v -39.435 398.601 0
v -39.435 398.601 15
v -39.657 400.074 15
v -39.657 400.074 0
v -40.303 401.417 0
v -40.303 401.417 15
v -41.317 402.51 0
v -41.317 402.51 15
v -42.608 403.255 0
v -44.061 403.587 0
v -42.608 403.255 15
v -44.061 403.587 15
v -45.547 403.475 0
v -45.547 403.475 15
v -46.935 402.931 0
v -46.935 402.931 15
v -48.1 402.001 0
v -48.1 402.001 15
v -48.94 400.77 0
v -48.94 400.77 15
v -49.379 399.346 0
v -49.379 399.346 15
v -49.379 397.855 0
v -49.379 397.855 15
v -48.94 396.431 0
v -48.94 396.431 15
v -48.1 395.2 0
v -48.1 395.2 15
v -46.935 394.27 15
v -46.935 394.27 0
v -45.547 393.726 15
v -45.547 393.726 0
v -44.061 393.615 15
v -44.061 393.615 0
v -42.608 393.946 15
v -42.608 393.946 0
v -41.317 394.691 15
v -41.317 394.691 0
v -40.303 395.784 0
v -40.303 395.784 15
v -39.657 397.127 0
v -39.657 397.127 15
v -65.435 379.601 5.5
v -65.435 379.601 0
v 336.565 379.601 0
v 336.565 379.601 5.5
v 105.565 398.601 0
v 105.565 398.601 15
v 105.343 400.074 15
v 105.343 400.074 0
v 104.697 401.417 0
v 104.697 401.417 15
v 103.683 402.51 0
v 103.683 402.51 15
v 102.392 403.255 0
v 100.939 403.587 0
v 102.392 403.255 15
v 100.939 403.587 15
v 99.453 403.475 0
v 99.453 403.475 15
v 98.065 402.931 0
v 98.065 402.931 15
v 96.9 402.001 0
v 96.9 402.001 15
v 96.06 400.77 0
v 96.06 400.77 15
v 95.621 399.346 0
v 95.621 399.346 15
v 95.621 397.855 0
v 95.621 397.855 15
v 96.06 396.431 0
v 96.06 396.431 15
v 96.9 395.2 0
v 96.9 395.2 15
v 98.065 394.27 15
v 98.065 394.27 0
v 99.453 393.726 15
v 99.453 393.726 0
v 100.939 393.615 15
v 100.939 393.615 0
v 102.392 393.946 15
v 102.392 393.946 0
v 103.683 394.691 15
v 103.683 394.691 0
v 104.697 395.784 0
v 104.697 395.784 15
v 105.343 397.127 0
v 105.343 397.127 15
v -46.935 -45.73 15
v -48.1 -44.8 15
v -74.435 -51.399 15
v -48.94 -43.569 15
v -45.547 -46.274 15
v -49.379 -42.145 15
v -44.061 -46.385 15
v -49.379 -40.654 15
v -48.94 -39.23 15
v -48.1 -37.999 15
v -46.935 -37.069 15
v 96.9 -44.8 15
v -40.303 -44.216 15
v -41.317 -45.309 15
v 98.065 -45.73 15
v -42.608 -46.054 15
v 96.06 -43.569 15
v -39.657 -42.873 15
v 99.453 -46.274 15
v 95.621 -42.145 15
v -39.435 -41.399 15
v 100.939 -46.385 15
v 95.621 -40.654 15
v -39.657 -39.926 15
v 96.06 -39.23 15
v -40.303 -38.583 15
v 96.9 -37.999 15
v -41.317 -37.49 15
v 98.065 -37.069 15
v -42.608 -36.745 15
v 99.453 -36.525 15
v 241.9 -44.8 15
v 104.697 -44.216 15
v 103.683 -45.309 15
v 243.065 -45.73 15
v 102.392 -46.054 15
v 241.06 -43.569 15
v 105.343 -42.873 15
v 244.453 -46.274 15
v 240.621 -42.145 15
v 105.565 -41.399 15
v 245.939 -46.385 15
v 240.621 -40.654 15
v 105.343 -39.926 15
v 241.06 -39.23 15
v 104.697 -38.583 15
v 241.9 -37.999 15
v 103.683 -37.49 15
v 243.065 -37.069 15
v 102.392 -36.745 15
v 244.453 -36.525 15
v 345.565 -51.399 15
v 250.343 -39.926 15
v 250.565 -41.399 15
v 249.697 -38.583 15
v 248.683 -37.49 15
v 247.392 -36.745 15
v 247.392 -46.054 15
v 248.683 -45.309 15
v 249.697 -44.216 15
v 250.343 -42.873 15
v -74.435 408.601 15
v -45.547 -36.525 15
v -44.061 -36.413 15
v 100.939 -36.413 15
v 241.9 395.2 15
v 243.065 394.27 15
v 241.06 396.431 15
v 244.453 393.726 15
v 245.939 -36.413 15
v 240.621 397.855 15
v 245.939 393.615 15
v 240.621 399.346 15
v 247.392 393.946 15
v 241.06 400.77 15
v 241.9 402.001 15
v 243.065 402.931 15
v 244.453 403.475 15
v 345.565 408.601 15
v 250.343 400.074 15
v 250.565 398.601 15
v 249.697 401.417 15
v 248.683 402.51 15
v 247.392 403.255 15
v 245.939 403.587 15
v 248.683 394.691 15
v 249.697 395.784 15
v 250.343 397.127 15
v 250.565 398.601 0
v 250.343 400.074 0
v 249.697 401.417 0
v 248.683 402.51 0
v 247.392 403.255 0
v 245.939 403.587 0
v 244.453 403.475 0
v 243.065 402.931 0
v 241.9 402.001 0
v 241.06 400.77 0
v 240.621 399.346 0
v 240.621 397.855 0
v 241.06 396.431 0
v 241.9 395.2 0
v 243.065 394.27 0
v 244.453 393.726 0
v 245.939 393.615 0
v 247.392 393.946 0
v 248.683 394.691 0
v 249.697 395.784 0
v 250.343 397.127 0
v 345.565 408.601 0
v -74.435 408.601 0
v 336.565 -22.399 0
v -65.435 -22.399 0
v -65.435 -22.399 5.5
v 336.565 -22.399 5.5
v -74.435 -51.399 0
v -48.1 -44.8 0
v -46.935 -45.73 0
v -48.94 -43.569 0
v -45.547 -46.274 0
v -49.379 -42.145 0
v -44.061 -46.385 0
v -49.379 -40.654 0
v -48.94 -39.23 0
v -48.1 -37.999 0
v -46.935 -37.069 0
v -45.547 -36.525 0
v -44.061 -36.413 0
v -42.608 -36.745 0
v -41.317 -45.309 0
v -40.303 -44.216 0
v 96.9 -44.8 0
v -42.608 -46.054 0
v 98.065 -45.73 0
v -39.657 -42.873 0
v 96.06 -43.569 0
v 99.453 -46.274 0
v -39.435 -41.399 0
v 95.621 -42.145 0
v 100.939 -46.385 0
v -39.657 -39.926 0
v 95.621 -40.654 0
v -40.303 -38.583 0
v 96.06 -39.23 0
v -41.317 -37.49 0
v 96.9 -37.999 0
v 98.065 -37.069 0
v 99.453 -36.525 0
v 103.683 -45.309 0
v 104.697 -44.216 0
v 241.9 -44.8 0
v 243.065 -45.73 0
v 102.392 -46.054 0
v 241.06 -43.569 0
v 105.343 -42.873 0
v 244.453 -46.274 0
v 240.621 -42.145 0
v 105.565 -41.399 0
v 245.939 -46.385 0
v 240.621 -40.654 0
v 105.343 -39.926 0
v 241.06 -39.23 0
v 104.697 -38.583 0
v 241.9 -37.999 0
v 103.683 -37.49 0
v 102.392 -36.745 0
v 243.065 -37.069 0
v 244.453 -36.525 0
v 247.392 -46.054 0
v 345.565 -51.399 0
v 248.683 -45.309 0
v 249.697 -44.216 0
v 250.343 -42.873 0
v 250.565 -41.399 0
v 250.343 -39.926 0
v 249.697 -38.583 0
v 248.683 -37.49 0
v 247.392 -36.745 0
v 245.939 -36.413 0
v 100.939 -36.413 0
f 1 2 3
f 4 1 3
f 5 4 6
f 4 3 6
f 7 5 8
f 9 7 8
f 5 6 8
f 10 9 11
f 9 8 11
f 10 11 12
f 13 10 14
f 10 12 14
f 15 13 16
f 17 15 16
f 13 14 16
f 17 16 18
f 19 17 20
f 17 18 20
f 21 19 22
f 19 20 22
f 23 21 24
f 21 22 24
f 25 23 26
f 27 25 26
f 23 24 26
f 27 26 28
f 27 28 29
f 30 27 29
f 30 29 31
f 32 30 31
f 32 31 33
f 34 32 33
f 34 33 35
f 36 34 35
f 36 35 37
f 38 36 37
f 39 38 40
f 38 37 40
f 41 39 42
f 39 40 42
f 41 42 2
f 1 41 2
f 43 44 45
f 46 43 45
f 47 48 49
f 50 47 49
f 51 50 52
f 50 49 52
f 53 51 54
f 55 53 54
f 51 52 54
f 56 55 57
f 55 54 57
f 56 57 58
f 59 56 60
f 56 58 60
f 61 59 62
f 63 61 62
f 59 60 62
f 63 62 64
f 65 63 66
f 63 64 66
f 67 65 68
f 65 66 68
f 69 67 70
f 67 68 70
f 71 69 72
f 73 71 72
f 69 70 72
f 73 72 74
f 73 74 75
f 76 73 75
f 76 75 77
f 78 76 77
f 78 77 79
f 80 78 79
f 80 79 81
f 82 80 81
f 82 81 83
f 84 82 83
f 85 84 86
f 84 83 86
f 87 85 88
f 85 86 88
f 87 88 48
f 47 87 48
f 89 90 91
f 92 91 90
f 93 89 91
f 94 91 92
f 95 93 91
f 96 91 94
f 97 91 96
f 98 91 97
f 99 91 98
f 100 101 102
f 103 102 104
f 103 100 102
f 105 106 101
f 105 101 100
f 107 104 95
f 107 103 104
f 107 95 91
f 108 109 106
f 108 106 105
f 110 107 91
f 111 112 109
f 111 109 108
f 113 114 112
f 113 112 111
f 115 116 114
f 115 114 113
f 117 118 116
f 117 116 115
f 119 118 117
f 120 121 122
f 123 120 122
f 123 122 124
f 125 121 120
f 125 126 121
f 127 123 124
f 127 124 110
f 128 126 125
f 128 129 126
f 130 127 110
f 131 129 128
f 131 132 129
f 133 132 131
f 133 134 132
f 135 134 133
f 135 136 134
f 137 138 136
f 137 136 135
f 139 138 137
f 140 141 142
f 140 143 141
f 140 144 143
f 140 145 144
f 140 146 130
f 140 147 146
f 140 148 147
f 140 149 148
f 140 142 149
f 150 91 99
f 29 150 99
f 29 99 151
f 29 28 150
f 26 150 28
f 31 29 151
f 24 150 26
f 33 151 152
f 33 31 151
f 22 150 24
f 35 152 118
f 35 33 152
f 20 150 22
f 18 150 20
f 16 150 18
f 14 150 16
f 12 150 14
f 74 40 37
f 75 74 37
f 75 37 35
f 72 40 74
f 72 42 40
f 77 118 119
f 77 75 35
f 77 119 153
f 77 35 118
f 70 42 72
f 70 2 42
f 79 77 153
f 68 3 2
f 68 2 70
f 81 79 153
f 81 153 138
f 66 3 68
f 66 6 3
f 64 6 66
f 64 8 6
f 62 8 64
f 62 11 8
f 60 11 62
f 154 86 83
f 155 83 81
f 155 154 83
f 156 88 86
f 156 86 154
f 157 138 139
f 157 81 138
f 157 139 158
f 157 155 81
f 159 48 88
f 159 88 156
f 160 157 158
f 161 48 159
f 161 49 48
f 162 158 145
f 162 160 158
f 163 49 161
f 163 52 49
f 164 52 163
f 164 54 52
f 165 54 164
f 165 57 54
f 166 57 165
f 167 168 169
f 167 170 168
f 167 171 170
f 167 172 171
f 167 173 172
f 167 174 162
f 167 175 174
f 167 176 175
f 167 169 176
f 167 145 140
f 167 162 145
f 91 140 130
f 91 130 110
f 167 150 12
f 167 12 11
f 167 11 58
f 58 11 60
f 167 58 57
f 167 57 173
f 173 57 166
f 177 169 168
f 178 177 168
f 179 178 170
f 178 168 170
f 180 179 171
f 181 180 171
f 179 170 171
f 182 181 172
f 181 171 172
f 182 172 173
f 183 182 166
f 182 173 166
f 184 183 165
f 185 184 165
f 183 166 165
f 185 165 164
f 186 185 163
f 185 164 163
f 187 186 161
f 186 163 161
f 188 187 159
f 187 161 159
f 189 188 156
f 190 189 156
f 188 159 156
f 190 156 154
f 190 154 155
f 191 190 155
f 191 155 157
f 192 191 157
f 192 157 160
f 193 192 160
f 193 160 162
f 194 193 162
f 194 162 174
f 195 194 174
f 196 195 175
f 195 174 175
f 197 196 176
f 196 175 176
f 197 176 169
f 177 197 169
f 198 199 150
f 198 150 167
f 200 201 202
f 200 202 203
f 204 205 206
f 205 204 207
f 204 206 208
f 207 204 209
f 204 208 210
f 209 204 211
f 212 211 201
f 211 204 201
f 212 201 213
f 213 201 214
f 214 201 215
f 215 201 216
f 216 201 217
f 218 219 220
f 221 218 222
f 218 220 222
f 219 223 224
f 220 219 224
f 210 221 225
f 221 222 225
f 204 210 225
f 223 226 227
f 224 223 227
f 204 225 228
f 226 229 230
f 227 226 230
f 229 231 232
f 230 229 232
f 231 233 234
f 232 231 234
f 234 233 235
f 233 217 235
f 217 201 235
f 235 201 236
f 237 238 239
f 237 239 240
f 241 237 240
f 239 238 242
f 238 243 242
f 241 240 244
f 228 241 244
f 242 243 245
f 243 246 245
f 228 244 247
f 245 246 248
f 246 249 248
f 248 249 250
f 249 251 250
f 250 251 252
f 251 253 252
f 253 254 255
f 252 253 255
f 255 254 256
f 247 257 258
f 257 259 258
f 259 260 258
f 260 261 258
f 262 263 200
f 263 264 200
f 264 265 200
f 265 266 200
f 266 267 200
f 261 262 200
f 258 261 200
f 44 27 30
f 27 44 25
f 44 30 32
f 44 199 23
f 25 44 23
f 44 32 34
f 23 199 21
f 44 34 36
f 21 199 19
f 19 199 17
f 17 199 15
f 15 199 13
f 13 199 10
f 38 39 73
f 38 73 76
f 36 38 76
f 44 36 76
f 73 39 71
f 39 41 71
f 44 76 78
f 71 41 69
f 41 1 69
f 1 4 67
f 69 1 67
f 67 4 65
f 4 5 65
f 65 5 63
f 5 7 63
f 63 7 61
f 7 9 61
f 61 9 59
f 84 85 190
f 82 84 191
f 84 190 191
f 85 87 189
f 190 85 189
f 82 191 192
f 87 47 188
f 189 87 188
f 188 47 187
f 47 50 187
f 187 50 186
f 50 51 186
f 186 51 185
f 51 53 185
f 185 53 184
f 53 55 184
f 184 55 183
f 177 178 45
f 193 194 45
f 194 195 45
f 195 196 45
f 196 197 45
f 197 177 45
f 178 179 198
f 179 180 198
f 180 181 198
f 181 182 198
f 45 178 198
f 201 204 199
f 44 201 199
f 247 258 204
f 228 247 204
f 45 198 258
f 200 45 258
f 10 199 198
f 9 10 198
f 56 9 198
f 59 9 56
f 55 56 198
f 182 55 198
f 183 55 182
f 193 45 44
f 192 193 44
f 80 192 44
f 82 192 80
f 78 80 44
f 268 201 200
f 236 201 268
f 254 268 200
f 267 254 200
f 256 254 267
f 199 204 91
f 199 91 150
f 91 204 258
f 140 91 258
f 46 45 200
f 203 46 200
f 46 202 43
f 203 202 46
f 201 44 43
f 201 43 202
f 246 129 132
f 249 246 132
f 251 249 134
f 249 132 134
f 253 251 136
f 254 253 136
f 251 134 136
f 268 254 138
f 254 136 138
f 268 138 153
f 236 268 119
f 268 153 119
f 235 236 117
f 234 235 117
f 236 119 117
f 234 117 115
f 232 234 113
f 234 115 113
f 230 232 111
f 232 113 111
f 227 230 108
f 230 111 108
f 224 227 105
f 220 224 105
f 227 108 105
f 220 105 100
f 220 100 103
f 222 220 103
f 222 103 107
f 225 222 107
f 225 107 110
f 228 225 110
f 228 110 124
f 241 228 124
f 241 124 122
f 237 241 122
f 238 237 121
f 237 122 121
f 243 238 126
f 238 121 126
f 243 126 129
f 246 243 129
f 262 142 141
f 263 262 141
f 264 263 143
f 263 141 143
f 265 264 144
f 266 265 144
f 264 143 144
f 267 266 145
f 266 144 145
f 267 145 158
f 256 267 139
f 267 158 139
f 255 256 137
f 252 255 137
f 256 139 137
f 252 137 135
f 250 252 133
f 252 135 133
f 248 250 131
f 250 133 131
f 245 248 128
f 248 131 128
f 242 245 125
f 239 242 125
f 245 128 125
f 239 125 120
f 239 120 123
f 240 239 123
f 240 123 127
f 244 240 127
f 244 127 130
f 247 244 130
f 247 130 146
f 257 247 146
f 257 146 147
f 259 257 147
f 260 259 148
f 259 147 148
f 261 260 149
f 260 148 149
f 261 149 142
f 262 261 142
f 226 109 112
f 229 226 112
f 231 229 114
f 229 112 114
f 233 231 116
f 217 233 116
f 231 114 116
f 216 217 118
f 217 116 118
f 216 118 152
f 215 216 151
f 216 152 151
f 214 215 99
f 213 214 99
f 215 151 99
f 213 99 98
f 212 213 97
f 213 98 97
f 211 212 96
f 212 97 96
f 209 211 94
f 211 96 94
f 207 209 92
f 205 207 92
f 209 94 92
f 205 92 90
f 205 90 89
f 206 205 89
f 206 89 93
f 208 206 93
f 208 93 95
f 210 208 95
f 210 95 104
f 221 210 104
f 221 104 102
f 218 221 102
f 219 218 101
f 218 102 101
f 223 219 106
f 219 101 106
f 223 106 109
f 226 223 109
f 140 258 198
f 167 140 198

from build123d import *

# Parameters (mm, degrees)
F0_W     = 420
F0_H     = 460
F1_DEPTH = 15
F2_R     = 5
F3_DEPTH = 15
F4_W     = 402
F4_H     = 402
F5_DEPTH = 5.5


with BuildPart() as f1:
    # F0 (on Top) → F1 (new body)
    with BuildSketch(Plane.XY):
        with Locations((135.56531, 178.600564)):
            Rectangle(F0_W, F0_H)
    extrude(amount=F1_DEPTH)

    # F2 (on face) → F3 (cut)
    with BuildSketch(Plane.XY.offset(15)):
        with Locations((245.56531, -41.399436)):
            Circle(F2_R)
        with Locations((-44.43469, -41.399436)):
            Circle(F2_R)
        with Locations((100.56531, -41.399436)):
            Circle(F2_R)
        with Locations((245.56531, 398.600564)):
            Circle(F2_R)
        with Locations((100.56531, 398.600564)):
            Circle(F2_R)
        with Locations((-44.43469, 398.600564)):
            Circle(F2_R)
    extrude(amount=-F3_DEPTH, mode=Mode.SUBTRACT)

    # F4 (on face) → F5 (cut)
    with BuildSketch(Plane(origin=(0, 0, 0), x_dir=(1, 0, 0), z_dir=(0, 0, -1))):
        with Locations((135.56531, -178.600564)):
            Rectangle(F4_W, F4_H)
    extrude(amount=-F5_DEPTH, mode=Mode.SUBTRACT)


solid = f1.part
